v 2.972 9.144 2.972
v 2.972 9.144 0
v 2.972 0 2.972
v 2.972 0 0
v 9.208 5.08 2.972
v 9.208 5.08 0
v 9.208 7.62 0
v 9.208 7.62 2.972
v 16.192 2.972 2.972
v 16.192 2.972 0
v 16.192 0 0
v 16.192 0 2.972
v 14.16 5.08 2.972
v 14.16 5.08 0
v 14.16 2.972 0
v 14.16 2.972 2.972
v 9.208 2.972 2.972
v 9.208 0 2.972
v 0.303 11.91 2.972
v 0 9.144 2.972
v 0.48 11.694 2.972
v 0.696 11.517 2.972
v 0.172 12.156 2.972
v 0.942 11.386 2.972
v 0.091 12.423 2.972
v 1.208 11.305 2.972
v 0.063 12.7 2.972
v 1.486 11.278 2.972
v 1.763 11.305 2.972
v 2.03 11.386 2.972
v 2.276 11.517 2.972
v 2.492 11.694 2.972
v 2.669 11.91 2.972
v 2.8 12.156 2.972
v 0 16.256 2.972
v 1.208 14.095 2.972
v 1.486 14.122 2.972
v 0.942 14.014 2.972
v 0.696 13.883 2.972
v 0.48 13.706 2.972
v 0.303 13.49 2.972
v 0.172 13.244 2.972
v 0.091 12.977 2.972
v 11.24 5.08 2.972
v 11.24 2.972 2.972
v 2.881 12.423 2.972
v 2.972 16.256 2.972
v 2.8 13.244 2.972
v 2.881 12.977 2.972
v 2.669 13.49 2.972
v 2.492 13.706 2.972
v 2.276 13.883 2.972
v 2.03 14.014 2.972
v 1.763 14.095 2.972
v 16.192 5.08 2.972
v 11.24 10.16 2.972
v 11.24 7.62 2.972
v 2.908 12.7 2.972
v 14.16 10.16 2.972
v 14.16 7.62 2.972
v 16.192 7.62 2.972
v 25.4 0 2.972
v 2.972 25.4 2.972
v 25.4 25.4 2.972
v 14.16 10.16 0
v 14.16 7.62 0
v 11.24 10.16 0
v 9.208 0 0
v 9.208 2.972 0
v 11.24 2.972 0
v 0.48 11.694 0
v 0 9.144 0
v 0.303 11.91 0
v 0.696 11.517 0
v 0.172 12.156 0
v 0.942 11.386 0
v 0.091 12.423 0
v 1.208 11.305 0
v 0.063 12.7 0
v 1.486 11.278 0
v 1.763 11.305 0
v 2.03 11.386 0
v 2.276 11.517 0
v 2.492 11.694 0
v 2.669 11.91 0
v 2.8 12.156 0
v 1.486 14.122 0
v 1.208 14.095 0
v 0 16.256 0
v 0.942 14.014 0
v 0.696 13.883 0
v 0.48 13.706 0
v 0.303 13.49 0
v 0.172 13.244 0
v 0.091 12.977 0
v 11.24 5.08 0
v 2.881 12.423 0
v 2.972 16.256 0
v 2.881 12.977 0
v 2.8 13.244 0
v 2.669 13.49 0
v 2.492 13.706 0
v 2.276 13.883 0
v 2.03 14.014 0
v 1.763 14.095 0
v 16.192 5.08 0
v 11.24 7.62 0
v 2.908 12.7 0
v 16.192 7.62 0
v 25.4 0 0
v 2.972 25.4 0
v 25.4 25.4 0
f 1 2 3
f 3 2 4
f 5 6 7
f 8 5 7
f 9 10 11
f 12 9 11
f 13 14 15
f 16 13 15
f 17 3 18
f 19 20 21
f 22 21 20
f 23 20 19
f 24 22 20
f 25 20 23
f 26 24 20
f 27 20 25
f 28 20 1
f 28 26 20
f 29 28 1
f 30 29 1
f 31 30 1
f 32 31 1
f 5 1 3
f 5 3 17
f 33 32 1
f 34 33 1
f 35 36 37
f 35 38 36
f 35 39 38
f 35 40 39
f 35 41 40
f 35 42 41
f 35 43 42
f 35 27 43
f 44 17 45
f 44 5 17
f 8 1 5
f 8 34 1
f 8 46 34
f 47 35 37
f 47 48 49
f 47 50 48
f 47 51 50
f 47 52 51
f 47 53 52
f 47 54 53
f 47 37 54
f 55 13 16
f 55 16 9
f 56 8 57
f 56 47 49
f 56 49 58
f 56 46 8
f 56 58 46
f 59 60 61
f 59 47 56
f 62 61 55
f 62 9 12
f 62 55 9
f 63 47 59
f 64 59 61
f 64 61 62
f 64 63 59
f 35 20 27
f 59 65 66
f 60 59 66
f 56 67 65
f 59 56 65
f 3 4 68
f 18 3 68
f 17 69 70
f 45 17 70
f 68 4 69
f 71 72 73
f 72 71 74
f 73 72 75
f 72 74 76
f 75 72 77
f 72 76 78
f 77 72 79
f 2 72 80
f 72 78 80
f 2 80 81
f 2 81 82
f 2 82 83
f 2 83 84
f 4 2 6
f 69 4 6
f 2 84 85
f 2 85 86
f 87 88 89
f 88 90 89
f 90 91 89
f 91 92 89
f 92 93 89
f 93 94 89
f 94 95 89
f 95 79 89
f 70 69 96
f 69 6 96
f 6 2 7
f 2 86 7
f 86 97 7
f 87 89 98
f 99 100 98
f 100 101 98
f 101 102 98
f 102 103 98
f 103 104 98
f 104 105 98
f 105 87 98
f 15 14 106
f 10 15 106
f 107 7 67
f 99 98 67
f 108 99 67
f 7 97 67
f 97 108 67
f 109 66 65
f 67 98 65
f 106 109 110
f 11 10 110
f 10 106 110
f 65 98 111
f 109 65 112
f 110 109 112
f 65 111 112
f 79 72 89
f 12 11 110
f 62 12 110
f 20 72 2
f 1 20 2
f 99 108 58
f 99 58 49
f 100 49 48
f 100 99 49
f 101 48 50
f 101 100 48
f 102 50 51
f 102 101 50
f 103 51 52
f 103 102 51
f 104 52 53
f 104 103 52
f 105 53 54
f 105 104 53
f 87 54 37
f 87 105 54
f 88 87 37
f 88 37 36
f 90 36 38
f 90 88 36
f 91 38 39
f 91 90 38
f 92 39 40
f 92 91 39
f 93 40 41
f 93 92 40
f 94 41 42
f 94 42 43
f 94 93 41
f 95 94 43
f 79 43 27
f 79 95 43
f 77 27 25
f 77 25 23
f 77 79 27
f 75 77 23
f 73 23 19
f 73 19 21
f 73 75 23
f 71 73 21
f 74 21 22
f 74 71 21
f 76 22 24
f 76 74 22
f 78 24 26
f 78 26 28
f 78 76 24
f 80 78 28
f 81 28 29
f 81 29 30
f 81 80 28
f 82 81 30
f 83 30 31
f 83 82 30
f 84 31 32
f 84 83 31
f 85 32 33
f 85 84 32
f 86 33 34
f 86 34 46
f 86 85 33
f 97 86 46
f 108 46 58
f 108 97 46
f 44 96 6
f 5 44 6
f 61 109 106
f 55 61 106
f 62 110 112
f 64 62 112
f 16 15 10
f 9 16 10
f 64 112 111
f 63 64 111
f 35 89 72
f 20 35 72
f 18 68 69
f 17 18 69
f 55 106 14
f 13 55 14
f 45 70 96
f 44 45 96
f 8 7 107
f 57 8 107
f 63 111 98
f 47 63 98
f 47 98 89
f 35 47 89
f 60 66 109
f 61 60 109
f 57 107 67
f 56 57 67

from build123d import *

# Parameters (mm, degrees)
SKETCH1_R           = 1.4224
BOSS_EXTRUDE1_DEPTH = 2.9718


with BuildPart() as part:
    # Sketch1 → Boss-Extrude1 (new body)
    with BuildSketch(Plane.XY):
        Polygon((25.4, 25.4), (2.9718, 25.4), (2.9718, 16.256), (0, 16.256), (0, 9.144), (2.9718, 9.144), (2.9718, 0), (9.2075, 0), (9.2075, 2.9718), (11.2395, 2.9718), (11.2395, 5.08), (9.2075, 5.08), (9.2075, 7.62), (11.2395, 7.62), (11.2395, 10.16), (14.1605, 10.16), (14.1605, 7.62), (16.1925, 7.62), (16.1925, 5.08), (14.1605, 5.08), (14.1605, 2.9718), (16.1925, 2.9718), (16.1925, 0), (25.4, 0), align=None)
        with Locations((1.4859, 12.7)):
            Circle(SKETCH1_R, mode=Mode.SUBTRACT)
    extrude(amount=BOSS_EXTRUDE1_DEPTH)


solid = part.part
